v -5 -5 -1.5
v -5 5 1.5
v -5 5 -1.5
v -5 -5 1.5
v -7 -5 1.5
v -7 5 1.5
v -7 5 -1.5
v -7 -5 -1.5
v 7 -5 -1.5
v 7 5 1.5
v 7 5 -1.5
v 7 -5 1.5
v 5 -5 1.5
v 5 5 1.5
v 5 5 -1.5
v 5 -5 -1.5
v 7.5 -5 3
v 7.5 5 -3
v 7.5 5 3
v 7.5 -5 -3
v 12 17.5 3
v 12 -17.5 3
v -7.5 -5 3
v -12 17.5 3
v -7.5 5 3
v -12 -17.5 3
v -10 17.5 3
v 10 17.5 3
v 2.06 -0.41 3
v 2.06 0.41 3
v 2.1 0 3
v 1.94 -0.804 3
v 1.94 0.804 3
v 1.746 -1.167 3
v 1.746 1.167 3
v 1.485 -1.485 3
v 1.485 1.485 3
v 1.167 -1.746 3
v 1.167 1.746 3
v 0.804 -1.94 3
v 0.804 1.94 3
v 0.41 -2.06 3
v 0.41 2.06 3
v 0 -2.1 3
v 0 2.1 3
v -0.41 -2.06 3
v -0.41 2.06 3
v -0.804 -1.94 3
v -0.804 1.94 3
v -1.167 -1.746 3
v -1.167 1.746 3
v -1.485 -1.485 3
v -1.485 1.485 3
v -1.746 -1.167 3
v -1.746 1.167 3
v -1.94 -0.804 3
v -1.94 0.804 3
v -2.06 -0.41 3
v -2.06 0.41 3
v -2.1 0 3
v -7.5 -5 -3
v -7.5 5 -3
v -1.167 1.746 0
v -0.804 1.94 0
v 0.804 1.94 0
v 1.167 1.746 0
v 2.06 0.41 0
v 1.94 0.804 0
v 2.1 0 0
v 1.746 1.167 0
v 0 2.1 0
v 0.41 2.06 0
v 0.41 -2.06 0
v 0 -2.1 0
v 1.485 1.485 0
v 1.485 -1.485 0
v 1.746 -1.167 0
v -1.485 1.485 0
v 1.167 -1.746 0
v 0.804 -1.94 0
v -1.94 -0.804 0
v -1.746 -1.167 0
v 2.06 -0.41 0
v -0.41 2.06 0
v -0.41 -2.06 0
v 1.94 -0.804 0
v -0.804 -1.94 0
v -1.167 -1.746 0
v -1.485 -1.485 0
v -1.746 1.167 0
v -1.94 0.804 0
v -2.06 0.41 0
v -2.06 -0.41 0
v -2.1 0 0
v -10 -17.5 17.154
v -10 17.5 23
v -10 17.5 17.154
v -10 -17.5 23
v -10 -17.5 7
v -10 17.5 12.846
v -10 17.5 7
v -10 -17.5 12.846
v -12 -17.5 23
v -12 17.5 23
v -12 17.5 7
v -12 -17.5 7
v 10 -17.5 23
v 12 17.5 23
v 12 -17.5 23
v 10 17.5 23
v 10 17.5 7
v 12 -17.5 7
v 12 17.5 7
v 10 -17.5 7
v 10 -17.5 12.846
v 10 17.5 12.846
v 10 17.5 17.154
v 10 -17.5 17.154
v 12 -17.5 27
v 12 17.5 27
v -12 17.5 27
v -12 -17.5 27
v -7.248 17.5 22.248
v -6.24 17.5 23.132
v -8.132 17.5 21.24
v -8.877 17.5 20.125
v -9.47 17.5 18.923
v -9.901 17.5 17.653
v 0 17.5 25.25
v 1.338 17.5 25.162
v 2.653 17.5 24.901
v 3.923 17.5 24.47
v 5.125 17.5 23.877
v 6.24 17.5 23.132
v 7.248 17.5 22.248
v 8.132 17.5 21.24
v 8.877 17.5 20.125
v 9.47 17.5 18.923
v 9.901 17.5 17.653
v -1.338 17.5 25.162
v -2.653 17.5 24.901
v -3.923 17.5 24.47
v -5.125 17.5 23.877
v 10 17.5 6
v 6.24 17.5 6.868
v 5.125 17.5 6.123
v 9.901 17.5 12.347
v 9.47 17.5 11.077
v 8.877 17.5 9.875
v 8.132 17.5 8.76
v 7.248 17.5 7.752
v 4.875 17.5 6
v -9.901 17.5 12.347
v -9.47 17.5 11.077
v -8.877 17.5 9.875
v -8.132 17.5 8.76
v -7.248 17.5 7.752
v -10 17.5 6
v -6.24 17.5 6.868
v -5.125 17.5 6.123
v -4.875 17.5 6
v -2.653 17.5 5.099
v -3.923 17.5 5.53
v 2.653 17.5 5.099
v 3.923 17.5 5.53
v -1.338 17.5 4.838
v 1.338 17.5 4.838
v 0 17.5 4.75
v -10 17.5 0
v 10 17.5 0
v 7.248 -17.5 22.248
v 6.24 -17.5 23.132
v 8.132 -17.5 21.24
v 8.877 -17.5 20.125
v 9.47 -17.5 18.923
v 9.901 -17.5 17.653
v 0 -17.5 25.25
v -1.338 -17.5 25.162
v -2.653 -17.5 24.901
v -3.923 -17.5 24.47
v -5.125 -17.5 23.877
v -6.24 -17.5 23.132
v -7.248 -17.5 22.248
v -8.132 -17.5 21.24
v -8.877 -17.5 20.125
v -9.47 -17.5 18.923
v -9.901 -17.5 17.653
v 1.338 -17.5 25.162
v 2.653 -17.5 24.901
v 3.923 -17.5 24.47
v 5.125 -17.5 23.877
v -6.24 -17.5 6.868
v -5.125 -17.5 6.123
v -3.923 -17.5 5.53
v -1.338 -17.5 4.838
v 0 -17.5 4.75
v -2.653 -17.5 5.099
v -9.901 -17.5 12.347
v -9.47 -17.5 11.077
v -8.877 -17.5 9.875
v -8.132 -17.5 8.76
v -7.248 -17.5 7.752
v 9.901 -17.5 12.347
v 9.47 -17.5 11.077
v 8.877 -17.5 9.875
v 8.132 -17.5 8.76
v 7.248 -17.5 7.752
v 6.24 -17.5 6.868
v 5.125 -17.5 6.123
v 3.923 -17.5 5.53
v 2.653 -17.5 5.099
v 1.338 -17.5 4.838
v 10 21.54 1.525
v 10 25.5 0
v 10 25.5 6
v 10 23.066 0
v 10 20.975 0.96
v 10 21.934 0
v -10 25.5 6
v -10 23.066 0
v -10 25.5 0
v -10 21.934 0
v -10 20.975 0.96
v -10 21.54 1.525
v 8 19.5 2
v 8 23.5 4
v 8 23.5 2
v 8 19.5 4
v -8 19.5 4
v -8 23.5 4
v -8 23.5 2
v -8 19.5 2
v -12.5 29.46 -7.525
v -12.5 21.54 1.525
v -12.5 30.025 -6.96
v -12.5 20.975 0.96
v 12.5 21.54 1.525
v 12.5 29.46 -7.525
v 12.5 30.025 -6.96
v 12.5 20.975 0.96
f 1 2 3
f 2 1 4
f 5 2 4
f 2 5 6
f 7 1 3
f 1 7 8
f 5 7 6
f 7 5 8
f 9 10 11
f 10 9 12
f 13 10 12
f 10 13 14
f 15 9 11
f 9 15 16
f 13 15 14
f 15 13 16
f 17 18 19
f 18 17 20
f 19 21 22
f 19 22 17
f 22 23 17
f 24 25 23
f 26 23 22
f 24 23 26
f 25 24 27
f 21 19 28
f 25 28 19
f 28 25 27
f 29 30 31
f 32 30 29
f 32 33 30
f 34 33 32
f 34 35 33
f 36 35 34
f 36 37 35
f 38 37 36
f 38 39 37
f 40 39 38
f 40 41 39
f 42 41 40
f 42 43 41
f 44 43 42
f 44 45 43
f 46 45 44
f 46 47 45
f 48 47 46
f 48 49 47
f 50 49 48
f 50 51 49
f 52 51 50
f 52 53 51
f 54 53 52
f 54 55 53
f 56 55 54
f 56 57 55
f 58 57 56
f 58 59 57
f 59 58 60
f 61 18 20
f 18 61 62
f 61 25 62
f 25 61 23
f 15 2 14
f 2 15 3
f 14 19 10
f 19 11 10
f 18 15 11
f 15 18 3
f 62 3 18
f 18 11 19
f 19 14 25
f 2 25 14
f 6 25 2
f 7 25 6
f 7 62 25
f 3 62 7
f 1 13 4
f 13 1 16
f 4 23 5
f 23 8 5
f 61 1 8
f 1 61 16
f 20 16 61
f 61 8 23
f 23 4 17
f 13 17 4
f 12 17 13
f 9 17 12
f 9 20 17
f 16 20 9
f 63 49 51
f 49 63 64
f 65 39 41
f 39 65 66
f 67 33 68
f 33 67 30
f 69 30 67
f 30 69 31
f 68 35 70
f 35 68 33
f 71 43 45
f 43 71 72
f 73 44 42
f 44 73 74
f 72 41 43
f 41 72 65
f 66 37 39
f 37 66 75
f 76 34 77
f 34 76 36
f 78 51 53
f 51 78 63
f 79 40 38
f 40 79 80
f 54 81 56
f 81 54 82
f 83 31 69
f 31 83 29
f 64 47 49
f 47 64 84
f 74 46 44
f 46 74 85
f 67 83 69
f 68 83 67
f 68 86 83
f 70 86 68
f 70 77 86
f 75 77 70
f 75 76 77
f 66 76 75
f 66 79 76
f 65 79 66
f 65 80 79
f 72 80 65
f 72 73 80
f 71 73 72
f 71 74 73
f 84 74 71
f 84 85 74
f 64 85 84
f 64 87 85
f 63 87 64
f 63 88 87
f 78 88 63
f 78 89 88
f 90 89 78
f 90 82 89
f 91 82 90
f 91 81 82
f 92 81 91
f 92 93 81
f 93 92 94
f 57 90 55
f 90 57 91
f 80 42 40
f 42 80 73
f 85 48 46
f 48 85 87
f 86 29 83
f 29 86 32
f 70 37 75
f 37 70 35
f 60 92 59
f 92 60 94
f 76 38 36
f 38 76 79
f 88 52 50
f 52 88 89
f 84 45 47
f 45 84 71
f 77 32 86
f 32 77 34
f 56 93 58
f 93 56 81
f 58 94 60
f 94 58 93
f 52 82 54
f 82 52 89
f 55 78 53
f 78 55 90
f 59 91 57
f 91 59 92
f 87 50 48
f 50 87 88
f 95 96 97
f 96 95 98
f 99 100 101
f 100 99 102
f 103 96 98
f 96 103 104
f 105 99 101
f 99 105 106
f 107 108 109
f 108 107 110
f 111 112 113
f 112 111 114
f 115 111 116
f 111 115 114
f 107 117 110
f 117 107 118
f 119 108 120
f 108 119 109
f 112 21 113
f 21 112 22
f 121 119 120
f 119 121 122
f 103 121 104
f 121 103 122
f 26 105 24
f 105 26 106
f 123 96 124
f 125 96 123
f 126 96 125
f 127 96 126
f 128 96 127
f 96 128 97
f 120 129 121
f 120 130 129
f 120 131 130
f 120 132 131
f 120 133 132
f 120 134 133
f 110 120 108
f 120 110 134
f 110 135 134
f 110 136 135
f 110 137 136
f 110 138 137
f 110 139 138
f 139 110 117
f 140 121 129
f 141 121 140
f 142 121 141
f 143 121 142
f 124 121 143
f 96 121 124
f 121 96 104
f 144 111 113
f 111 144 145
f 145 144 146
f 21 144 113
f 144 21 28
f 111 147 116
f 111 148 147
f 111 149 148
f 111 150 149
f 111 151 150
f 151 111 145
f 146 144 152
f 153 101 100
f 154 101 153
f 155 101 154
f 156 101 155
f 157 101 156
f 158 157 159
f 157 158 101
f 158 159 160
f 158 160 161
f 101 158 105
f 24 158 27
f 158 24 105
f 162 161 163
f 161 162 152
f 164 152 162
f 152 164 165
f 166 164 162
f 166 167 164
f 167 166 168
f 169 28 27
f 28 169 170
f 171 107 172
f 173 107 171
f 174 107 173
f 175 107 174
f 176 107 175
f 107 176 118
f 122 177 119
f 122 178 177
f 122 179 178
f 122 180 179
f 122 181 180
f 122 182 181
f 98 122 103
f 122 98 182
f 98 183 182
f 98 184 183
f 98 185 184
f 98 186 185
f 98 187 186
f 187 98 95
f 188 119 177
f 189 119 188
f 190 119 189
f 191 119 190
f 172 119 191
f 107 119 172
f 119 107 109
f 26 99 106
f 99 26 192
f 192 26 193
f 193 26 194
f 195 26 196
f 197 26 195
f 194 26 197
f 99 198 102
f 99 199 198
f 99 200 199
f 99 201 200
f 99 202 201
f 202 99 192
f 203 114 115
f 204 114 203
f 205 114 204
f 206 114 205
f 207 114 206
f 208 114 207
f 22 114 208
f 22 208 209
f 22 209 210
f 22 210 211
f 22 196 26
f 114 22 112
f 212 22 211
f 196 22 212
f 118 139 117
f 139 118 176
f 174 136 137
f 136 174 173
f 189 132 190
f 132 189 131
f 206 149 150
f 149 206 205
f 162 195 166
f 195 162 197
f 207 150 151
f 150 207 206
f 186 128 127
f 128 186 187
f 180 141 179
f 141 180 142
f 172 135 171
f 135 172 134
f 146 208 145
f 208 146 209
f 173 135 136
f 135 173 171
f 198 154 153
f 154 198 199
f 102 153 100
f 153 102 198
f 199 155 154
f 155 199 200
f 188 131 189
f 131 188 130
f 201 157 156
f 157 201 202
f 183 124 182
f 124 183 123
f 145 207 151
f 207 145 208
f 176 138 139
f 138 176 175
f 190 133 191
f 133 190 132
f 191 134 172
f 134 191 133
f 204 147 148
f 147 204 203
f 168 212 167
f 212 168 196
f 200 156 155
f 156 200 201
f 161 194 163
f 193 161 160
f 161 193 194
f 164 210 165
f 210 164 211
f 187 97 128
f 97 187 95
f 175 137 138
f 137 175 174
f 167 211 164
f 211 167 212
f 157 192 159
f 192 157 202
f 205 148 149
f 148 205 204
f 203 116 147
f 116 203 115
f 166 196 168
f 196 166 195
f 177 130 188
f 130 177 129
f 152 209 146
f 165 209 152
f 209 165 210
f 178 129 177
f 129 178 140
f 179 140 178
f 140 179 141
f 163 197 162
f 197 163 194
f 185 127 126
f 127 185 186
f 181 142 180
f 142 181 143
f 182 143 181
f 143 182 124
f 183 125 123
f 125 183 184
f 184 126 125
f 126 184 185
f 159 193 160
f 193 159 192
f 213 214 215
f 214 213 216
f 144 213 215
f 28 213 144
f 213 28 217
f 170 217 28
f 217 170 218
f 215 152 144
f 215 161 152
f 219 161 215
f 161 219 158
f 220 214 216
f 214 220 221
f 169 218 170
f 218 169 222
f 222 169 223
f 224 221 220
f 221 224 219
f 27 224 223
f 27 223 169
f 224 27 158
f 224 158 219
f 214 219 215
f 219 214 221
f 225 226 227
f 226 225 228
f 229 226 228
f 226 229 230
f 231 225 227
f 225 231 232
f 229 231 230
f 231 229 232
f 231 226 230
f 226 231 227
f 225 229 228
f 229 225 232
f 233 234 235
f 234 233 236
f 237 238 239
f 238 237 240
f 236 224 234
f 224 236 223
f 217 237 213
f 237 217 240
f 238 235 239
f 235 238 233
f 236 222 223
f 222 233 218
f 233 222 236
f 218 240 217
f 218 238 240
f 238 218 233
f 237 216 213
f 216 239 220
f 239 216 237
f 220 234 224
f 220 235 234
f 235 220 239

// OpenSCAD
// AstraAnt Tool: Paste Applicator Nozzle
// Print body in PETG. Silicone tube reservoir purchased separately.
// Mandible squeeze pushes paste through slit nozzle.
// Trowel blade on bottom smooths the applied layer.
//
// Print orientation: mount face down
// Supports: needed for nozzle overhang

$fn = 48;


// Universal magnetic mount interface
// Clips between ant mandibles, held by neodymium magnets
module magnetic_mount(width=15, depth=10, magnet_d=4) {
    difference() {
        // Mount body
        cube([width, depth, 6], center=true);
        // Magnet pocket (recessed)
        translate([0, 0, 1.5])
            cylinder(d=4+0.2, h=3, center=true, $fn=32);
        // Mandible grip grooves (two channels for ant mandibles)
        for (side = [-1, 1]) {
            translate([side * (width/2 - 1.5), 0, 0])
                cube([2, depth+1, 3], center=true);
        }
    }
}


// Parameters
reservoir_od = 20;      // Silicone tube outer diameter
reservoir_length = 35;
nozzle_width = 20;
nozzle_slit = 2;        // Slit height controls paste thickness
trowel_width = 25;
trowel_angle = 45;

module reservoir_cradle() {
    // Holds the silicone tube reservoir
    difference() {
        cube([reservoir_od + 4, reservoir_length, reservoir_od + 4], center=true);
        // Tube channel
        rotate([90, 0, 0])
            cylinder(d=reservoir_od + 0.5, h=reservoir_length + 1, center=true);
        // Squeeze access (open sides for mandible grip)
        for (side = [-1, 1]) {
            translate([side * (reservoir_od/2 + 2), 0, 0])
                cube([4, reservoir_length + 1, reservoir_od - 4], center=true);
        }
    }
}

module nozzle() {
    // Flat slit nozzle
    difference() {
        cube([nozzle_width, 8, 6], center=true);
        // Slit opening
        cube([nozzle_width - 4, 4, nozzle_slit], center=true);
    }
}

module trowel() {
    // Flat blade for smoothing
    translate([0, 0, -3])
        rotate([trowel_angle, 0, 0])
            cube([trowel_width, 0.8, 12], center=true);
}

module paste_nozzle_assembly() {
    magnetic_mount();
    translate([0, 0, 3 + reservoir_od/2 + 2])
        reservoir_cradle();
    translate([0, reservoir_length/2 + 4, 3])
        nozzle();
    translate([0, reservoir_length/2 + 8, 0])
        trowel();
}

paste_nozzle_assembly();
